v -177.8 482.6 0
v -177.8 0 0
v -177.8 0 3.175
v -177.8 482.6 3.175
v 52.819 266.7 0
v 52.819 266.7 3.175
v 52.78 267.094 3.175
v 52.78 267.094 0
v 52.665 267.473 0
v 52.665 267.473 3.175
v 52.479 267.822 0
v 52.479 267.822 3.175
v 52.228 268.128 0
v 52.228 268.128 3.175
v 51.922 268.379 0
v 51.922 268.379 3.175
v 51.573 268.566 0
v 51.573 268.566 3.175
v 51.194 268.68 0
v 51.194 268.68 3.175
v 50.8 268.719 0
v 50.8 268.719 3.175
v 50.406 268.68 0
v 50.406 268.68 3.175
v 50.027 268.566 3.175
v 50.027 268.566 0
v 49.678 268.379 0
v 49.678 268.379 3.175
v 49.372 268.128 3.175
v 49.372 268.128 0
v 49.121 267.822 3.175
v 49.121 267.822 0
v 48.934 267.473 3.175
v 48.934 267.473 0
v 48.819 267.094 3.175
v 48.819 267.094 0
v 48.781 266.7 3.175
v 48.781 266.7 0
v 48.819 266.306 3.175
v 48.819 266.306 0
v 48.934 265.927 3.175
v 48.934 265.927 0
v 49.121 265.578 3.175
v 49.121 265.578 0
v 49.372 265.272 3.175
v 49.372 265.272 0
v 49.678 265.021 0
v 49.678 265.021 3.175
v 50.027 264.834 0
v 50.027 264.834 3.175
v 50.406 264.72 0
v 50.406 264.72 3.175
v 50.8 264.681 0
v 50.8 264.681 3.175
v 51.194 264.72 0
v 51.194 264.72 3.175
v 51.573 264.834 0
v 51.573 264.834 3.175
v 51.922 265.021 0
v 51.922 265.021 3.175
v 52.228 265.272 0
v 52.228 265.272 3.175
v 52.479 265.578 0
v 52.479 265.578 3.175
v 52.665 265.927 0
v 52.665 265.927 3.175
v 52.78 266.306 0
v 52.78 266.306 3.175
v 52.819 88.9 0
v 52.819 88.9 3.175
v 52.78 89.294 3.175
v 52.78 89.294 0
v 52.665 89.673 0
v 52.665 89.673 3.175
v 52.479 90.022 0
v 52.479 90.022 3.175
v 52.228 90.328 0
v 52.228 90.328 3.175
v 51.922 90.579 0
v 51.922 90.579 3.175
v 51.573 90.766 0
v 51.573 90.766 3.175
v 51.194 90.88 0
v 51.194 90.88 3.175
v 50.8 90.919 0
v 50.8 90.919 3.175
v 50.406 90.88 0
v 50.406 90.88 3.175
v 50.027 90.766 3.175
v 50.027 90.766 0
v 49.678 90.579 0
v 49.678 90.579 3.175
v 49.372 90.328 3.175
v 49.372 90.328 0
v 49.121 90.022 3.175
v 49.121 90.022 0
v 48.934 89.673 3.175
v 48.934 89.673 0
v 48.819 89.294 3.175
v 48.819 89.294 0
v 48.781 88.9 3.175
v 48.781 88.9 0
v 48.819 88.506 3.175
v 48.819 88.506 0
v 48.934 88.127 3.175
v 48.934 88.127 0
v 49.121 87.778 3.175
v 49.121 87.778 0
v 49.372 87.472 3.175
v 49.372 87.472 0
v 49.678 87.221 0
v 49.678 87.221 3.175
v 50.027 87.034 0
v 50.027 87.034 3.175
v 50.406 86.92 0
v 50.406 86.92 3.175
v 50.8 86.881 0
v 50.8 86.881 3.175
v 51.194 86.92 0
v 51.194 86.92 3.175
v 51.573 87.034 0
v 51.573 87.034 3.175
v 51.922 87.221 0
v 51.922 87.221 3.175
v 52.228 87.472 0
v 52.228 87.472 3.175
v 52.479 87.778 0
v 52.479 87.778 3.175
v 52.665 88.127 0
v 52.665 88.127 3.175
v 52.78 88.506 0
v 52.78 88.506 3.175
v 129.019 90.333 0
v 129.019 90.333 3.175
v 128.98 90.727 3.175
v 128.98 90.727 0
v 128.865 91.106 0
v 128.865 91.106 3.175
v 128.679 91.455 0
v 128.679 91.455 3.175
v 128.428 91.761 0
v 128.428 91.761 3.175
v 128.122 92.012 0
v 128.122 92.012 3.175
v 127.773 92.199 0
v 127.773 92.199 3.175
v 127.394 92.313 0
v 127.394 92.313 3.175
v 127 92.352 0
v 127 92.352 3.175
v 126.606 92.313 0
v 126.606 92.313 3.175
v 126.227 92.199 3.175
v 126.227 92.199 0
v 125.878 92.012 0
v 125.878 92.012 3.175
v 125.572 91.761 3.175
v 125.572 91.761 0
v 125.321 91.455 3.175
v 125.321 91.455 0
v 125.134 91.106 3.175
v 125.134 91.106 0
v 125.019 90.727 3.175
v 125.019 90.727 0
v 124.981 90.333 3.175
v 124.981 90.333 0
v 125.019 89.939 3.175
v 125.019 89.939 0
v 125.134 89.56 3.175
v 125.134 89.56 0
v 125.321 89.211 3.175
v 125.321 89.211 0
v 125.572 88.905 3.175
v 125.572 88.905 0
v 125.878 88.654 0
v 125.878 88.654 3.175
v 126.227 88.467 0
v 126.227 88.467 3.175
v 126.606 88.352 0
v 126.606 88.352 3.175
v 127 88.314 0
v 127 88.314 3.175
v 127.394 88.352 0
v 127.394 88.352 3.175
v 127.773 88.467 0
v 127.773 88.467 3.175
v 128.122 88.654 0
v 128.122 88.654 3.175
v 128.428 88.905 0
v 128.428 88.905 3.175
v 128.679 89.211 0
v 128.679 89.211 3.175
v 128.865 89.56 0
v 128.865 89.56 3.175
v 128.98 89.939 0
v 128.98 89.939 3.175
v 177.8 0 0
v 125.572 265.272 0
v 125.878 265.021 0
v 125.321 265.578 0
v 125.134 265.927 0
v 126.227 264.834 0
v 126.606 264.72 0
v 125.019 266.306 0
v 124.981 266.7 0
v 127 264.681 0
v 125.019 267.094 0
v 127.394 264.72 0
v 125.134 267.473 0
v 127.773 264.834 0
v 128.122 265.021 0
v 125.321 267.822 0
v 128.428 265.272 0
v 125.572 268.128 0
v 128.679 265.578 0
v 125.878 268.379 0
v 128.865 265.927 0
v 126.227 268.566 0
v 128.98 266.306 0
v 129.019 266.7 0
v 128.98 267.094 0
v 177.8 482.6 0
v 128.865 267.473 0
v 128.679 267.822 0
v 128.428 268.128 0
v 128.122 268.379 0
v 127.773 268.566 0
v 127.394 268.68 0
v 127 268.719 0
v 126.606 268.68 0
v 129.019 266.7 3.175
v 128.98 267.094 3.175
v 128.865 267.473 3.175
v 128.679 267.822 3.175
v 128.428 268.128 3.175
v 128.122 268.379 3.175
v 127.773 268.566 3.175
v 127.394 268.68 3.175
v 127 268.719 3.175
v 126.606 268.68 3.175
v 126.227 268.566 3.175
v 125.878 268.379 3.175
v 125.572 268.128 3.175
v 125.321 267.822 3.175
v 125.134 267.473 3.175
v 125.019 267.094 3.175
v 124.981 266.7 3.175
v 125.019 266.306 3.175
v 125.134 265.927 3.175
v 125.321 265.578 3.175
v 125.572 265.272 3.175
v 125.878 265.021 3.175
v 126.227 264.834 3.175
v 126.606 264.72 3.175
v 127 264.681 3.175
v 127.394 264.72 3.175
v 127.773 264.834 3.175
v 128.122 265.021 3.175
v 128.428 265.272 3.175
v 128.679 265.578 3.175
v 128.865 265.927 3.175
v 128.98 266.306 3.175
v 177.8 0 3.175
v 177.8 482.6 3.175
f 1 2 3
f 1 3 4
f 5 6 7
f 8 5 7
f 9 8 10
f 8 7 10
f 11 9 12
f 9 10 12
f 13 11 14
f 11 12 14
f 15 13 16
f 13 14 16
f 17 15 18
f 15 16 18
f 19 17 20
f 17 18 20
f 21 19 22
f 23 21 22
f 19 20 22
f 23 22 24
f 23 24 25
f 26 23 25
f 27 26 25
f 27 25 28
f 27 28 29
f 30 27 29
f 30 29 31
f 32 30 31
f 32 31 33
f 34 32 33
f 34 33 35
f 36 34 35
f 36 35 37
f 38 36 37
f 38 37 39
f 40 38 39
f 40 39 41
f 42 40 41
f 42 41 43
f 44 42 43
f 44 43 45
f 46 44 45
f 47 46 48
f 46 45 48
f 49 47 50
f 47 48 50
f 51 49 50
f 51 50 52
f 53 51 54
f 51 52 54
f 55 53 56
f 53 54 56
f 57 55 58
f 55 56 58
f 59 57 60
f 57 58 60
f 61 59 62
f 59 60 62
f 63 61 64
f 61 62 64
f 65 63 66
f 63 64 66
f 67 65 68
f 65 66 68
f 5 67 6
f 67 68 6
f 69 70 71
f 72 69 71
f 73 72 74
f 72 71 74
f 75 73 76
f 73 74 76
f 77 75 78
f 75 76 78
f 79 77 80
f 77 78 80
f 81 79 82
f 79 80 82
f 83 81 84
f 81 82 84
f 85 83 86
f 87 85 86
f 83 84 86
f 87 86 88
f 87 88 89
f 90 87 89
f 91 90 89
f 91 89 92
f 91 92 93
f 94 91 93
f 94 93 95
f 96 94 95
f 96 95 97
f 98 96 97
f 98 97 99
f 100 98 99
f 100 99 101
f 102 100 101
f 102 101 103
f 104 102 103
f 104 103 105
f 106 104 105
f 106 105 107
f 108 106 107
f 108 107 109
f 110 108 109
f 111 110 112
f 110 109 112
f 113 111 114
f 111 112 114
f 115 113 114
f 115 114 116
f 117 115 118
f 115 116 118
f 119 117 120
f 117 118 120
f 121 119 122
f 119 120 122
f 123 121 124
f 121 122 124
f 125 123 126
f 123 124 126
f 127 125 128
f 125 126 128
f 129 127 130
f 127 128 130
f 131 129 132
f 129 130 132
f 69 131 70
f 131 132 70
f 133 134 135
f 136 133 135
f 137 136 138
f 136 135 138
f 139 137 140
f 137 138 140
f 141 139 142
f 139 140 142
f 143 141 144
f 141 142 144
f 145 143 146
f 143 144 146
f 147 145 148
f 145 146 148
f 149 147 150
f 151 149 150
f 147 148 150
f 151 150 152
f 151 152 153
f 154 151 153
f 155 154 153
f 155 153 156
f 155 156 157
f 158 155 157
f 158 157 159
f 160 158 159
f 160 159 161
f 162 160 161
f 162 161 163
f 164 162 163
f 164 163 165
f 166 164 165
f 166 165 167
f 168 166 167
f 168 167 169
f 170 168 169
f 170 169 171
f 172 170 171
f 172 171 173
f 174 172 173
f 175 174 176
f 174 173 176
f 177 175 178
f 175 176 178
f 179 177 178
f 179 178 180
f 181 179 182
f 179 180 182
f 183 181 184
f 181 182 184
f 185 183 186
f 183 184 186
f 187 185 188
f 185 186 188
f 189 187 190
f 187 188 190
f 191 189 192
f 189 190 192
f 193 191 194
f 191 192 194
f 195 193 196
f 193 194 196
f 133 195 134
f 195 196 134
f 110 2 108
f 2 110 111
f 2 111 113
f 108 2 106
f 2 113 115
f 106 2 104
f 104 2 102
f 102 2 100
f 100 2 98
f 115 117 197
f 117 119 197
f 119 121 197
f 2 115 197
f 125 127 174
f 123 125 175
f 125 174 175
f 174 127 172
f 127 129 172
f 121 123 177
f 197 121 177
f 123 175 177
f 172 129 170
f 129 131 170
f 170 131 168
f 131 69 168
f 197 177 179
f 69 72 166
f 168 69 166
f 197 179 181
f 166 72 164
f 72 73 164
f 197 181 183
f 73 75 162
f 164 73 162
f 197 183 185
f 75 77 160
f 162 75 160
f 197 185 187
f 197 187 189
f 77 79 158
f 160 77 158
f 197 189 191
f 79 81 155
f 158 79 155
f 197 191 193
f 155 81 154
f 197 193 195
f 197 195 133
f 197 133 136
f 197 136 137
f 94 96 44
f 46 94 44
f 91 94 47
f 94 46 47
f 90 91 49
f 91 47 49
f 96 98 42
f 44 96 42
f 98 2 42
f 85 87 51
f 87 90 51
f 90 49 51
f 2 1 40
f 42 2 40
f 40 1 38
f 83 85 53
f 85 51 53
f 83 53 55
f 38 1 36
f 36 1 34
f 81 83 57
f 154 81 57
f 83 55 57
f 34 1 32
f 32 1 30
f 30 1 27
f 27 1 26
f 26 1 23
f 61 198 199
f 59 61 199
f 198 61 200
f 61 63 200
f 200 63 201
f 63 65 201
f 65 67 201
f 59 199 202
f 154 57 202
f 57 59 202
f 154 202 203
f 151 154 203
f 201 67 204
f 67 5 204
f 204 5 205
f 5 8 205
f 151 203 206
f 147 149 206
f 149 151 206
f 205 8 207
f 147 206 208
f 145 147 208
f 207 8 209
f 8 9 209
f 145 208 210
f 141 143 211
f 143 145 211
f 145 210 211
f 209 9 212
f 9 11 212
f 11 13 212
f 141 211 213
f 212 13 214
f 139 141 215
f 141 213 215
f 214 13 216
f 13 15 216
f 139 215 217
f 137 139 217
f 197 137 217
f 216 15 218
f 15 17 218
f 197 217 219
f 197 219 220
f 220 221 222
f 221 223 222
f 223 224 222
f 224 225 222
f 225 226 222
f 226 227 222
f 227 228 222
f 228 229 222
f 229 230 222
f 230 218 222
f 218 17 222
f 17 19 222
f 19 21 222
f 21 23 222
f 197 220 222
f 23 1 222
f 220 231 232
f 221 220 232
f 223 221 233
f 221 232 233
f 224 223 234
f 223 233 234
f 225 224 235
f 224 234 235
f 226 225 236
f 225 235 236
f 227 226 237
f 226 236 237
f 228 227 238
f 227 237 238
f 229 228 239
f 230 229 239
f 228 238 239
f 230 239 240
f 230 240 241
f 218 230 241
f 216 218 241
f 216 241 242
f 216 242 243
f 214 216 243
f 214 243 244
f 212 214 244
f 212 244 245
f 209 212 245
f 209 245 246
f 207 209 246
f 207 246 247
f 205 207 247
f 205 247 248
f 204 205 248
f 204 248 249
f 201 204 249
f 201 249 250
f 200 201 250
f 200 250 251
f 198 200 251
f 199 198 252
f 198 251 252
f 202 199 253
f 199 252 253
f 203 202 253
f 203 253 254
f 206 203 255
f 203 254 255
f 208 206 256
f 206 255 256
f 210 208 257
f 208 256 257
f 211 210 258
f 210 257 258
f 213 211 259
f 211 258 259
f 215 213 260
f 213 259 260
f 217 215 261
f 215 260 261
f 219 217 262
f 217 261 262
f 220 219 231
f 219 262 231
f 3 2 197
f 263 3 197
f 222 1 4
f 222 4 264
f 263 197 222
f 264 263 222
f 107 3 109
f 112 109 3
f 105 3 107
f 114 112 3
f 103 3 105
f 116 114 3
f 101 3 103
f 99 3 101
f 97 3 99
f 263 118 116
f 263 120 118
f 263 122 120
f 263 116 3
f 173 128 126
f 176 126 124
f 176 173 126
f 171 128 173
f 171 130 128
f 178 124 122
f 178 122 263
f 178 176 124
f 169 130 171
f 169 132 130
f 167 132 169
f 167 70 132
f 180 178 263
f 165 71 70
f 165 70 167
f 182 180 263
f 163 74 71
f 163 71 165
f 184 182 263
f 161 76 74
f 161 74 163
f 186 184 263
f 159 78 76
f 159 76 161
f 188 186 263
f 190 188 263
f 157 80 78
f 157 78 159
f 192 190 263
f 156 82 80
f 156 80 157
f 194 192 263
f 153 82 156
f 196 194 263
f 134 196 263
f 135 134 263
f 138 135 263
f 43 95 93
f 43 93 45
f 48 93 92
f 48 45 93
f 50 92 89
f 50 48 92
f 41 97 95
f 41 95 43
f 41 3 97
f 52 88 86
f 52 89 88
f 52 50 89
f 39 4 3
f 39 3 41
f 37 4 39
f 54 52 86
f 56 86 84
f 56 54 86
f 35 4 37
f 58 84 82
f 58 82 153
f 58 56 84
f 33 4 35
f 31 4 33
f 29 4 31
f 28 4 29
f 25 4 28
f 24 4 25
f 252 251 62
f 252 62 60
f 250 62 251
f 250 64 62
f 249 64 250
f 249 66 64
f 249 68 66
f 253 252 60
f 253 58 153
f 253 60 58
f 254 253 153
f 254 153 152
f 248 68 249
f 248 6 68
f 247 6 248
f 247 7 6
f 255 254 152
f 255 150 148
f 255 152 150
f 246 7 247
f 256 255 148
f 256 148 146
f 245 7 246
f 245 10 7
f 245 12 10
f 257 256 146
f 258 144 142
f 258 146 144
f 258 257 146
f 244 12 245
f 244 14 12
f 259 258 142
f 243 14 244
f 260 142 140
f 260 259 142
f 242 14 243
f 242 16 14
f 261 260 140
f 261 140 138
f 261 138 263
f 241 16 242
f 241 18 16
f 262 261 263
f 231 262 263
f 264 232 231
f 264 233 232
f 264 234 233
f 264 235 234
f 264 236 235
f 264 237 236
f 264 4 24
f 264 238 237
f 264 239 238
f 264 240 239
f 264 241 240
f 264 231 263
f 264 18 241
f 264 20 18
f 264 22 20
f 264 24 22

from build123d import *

# Parameters (mm, degrees)
SKETCH1_W                  = 355.6
SKETCH1_H                  = 482.6
EXTRUDE1_DEPTH             = 3.175
F_10_CLEARANCE_HOLE1_D     = 4.0386
F_10_CLEARANCE_HOLE1_DEPTH = 3.175


with BuildPart() as part:
    # Sketch1 → Extrude1 (new body)
    with BuildSketch(Plane.XY):
        with Locations((0, 241.3)):
            Rectangle(SKETCH1_W, SKETCH1_H)
    extrude(amount=EXTRUDE1_DEPTH)

    # #10 Clearance Hole1
    with Locations(Plane(origin=(0, 0, 0), x_dir=(-1, 0, 0), z_dir=(0, 0, -1))):
        with Locations((-126.999855288, 266.7), (-50.799855288, 266.7), (-50.799855288, 88.9), (-126.999855288, 90.332964778)):
            Hole(F_10_CLEARANCE_HOLE1_D / 2, depth=F_10_CLEARANCE_HOLE1_DEPTH)


solid = part.part
